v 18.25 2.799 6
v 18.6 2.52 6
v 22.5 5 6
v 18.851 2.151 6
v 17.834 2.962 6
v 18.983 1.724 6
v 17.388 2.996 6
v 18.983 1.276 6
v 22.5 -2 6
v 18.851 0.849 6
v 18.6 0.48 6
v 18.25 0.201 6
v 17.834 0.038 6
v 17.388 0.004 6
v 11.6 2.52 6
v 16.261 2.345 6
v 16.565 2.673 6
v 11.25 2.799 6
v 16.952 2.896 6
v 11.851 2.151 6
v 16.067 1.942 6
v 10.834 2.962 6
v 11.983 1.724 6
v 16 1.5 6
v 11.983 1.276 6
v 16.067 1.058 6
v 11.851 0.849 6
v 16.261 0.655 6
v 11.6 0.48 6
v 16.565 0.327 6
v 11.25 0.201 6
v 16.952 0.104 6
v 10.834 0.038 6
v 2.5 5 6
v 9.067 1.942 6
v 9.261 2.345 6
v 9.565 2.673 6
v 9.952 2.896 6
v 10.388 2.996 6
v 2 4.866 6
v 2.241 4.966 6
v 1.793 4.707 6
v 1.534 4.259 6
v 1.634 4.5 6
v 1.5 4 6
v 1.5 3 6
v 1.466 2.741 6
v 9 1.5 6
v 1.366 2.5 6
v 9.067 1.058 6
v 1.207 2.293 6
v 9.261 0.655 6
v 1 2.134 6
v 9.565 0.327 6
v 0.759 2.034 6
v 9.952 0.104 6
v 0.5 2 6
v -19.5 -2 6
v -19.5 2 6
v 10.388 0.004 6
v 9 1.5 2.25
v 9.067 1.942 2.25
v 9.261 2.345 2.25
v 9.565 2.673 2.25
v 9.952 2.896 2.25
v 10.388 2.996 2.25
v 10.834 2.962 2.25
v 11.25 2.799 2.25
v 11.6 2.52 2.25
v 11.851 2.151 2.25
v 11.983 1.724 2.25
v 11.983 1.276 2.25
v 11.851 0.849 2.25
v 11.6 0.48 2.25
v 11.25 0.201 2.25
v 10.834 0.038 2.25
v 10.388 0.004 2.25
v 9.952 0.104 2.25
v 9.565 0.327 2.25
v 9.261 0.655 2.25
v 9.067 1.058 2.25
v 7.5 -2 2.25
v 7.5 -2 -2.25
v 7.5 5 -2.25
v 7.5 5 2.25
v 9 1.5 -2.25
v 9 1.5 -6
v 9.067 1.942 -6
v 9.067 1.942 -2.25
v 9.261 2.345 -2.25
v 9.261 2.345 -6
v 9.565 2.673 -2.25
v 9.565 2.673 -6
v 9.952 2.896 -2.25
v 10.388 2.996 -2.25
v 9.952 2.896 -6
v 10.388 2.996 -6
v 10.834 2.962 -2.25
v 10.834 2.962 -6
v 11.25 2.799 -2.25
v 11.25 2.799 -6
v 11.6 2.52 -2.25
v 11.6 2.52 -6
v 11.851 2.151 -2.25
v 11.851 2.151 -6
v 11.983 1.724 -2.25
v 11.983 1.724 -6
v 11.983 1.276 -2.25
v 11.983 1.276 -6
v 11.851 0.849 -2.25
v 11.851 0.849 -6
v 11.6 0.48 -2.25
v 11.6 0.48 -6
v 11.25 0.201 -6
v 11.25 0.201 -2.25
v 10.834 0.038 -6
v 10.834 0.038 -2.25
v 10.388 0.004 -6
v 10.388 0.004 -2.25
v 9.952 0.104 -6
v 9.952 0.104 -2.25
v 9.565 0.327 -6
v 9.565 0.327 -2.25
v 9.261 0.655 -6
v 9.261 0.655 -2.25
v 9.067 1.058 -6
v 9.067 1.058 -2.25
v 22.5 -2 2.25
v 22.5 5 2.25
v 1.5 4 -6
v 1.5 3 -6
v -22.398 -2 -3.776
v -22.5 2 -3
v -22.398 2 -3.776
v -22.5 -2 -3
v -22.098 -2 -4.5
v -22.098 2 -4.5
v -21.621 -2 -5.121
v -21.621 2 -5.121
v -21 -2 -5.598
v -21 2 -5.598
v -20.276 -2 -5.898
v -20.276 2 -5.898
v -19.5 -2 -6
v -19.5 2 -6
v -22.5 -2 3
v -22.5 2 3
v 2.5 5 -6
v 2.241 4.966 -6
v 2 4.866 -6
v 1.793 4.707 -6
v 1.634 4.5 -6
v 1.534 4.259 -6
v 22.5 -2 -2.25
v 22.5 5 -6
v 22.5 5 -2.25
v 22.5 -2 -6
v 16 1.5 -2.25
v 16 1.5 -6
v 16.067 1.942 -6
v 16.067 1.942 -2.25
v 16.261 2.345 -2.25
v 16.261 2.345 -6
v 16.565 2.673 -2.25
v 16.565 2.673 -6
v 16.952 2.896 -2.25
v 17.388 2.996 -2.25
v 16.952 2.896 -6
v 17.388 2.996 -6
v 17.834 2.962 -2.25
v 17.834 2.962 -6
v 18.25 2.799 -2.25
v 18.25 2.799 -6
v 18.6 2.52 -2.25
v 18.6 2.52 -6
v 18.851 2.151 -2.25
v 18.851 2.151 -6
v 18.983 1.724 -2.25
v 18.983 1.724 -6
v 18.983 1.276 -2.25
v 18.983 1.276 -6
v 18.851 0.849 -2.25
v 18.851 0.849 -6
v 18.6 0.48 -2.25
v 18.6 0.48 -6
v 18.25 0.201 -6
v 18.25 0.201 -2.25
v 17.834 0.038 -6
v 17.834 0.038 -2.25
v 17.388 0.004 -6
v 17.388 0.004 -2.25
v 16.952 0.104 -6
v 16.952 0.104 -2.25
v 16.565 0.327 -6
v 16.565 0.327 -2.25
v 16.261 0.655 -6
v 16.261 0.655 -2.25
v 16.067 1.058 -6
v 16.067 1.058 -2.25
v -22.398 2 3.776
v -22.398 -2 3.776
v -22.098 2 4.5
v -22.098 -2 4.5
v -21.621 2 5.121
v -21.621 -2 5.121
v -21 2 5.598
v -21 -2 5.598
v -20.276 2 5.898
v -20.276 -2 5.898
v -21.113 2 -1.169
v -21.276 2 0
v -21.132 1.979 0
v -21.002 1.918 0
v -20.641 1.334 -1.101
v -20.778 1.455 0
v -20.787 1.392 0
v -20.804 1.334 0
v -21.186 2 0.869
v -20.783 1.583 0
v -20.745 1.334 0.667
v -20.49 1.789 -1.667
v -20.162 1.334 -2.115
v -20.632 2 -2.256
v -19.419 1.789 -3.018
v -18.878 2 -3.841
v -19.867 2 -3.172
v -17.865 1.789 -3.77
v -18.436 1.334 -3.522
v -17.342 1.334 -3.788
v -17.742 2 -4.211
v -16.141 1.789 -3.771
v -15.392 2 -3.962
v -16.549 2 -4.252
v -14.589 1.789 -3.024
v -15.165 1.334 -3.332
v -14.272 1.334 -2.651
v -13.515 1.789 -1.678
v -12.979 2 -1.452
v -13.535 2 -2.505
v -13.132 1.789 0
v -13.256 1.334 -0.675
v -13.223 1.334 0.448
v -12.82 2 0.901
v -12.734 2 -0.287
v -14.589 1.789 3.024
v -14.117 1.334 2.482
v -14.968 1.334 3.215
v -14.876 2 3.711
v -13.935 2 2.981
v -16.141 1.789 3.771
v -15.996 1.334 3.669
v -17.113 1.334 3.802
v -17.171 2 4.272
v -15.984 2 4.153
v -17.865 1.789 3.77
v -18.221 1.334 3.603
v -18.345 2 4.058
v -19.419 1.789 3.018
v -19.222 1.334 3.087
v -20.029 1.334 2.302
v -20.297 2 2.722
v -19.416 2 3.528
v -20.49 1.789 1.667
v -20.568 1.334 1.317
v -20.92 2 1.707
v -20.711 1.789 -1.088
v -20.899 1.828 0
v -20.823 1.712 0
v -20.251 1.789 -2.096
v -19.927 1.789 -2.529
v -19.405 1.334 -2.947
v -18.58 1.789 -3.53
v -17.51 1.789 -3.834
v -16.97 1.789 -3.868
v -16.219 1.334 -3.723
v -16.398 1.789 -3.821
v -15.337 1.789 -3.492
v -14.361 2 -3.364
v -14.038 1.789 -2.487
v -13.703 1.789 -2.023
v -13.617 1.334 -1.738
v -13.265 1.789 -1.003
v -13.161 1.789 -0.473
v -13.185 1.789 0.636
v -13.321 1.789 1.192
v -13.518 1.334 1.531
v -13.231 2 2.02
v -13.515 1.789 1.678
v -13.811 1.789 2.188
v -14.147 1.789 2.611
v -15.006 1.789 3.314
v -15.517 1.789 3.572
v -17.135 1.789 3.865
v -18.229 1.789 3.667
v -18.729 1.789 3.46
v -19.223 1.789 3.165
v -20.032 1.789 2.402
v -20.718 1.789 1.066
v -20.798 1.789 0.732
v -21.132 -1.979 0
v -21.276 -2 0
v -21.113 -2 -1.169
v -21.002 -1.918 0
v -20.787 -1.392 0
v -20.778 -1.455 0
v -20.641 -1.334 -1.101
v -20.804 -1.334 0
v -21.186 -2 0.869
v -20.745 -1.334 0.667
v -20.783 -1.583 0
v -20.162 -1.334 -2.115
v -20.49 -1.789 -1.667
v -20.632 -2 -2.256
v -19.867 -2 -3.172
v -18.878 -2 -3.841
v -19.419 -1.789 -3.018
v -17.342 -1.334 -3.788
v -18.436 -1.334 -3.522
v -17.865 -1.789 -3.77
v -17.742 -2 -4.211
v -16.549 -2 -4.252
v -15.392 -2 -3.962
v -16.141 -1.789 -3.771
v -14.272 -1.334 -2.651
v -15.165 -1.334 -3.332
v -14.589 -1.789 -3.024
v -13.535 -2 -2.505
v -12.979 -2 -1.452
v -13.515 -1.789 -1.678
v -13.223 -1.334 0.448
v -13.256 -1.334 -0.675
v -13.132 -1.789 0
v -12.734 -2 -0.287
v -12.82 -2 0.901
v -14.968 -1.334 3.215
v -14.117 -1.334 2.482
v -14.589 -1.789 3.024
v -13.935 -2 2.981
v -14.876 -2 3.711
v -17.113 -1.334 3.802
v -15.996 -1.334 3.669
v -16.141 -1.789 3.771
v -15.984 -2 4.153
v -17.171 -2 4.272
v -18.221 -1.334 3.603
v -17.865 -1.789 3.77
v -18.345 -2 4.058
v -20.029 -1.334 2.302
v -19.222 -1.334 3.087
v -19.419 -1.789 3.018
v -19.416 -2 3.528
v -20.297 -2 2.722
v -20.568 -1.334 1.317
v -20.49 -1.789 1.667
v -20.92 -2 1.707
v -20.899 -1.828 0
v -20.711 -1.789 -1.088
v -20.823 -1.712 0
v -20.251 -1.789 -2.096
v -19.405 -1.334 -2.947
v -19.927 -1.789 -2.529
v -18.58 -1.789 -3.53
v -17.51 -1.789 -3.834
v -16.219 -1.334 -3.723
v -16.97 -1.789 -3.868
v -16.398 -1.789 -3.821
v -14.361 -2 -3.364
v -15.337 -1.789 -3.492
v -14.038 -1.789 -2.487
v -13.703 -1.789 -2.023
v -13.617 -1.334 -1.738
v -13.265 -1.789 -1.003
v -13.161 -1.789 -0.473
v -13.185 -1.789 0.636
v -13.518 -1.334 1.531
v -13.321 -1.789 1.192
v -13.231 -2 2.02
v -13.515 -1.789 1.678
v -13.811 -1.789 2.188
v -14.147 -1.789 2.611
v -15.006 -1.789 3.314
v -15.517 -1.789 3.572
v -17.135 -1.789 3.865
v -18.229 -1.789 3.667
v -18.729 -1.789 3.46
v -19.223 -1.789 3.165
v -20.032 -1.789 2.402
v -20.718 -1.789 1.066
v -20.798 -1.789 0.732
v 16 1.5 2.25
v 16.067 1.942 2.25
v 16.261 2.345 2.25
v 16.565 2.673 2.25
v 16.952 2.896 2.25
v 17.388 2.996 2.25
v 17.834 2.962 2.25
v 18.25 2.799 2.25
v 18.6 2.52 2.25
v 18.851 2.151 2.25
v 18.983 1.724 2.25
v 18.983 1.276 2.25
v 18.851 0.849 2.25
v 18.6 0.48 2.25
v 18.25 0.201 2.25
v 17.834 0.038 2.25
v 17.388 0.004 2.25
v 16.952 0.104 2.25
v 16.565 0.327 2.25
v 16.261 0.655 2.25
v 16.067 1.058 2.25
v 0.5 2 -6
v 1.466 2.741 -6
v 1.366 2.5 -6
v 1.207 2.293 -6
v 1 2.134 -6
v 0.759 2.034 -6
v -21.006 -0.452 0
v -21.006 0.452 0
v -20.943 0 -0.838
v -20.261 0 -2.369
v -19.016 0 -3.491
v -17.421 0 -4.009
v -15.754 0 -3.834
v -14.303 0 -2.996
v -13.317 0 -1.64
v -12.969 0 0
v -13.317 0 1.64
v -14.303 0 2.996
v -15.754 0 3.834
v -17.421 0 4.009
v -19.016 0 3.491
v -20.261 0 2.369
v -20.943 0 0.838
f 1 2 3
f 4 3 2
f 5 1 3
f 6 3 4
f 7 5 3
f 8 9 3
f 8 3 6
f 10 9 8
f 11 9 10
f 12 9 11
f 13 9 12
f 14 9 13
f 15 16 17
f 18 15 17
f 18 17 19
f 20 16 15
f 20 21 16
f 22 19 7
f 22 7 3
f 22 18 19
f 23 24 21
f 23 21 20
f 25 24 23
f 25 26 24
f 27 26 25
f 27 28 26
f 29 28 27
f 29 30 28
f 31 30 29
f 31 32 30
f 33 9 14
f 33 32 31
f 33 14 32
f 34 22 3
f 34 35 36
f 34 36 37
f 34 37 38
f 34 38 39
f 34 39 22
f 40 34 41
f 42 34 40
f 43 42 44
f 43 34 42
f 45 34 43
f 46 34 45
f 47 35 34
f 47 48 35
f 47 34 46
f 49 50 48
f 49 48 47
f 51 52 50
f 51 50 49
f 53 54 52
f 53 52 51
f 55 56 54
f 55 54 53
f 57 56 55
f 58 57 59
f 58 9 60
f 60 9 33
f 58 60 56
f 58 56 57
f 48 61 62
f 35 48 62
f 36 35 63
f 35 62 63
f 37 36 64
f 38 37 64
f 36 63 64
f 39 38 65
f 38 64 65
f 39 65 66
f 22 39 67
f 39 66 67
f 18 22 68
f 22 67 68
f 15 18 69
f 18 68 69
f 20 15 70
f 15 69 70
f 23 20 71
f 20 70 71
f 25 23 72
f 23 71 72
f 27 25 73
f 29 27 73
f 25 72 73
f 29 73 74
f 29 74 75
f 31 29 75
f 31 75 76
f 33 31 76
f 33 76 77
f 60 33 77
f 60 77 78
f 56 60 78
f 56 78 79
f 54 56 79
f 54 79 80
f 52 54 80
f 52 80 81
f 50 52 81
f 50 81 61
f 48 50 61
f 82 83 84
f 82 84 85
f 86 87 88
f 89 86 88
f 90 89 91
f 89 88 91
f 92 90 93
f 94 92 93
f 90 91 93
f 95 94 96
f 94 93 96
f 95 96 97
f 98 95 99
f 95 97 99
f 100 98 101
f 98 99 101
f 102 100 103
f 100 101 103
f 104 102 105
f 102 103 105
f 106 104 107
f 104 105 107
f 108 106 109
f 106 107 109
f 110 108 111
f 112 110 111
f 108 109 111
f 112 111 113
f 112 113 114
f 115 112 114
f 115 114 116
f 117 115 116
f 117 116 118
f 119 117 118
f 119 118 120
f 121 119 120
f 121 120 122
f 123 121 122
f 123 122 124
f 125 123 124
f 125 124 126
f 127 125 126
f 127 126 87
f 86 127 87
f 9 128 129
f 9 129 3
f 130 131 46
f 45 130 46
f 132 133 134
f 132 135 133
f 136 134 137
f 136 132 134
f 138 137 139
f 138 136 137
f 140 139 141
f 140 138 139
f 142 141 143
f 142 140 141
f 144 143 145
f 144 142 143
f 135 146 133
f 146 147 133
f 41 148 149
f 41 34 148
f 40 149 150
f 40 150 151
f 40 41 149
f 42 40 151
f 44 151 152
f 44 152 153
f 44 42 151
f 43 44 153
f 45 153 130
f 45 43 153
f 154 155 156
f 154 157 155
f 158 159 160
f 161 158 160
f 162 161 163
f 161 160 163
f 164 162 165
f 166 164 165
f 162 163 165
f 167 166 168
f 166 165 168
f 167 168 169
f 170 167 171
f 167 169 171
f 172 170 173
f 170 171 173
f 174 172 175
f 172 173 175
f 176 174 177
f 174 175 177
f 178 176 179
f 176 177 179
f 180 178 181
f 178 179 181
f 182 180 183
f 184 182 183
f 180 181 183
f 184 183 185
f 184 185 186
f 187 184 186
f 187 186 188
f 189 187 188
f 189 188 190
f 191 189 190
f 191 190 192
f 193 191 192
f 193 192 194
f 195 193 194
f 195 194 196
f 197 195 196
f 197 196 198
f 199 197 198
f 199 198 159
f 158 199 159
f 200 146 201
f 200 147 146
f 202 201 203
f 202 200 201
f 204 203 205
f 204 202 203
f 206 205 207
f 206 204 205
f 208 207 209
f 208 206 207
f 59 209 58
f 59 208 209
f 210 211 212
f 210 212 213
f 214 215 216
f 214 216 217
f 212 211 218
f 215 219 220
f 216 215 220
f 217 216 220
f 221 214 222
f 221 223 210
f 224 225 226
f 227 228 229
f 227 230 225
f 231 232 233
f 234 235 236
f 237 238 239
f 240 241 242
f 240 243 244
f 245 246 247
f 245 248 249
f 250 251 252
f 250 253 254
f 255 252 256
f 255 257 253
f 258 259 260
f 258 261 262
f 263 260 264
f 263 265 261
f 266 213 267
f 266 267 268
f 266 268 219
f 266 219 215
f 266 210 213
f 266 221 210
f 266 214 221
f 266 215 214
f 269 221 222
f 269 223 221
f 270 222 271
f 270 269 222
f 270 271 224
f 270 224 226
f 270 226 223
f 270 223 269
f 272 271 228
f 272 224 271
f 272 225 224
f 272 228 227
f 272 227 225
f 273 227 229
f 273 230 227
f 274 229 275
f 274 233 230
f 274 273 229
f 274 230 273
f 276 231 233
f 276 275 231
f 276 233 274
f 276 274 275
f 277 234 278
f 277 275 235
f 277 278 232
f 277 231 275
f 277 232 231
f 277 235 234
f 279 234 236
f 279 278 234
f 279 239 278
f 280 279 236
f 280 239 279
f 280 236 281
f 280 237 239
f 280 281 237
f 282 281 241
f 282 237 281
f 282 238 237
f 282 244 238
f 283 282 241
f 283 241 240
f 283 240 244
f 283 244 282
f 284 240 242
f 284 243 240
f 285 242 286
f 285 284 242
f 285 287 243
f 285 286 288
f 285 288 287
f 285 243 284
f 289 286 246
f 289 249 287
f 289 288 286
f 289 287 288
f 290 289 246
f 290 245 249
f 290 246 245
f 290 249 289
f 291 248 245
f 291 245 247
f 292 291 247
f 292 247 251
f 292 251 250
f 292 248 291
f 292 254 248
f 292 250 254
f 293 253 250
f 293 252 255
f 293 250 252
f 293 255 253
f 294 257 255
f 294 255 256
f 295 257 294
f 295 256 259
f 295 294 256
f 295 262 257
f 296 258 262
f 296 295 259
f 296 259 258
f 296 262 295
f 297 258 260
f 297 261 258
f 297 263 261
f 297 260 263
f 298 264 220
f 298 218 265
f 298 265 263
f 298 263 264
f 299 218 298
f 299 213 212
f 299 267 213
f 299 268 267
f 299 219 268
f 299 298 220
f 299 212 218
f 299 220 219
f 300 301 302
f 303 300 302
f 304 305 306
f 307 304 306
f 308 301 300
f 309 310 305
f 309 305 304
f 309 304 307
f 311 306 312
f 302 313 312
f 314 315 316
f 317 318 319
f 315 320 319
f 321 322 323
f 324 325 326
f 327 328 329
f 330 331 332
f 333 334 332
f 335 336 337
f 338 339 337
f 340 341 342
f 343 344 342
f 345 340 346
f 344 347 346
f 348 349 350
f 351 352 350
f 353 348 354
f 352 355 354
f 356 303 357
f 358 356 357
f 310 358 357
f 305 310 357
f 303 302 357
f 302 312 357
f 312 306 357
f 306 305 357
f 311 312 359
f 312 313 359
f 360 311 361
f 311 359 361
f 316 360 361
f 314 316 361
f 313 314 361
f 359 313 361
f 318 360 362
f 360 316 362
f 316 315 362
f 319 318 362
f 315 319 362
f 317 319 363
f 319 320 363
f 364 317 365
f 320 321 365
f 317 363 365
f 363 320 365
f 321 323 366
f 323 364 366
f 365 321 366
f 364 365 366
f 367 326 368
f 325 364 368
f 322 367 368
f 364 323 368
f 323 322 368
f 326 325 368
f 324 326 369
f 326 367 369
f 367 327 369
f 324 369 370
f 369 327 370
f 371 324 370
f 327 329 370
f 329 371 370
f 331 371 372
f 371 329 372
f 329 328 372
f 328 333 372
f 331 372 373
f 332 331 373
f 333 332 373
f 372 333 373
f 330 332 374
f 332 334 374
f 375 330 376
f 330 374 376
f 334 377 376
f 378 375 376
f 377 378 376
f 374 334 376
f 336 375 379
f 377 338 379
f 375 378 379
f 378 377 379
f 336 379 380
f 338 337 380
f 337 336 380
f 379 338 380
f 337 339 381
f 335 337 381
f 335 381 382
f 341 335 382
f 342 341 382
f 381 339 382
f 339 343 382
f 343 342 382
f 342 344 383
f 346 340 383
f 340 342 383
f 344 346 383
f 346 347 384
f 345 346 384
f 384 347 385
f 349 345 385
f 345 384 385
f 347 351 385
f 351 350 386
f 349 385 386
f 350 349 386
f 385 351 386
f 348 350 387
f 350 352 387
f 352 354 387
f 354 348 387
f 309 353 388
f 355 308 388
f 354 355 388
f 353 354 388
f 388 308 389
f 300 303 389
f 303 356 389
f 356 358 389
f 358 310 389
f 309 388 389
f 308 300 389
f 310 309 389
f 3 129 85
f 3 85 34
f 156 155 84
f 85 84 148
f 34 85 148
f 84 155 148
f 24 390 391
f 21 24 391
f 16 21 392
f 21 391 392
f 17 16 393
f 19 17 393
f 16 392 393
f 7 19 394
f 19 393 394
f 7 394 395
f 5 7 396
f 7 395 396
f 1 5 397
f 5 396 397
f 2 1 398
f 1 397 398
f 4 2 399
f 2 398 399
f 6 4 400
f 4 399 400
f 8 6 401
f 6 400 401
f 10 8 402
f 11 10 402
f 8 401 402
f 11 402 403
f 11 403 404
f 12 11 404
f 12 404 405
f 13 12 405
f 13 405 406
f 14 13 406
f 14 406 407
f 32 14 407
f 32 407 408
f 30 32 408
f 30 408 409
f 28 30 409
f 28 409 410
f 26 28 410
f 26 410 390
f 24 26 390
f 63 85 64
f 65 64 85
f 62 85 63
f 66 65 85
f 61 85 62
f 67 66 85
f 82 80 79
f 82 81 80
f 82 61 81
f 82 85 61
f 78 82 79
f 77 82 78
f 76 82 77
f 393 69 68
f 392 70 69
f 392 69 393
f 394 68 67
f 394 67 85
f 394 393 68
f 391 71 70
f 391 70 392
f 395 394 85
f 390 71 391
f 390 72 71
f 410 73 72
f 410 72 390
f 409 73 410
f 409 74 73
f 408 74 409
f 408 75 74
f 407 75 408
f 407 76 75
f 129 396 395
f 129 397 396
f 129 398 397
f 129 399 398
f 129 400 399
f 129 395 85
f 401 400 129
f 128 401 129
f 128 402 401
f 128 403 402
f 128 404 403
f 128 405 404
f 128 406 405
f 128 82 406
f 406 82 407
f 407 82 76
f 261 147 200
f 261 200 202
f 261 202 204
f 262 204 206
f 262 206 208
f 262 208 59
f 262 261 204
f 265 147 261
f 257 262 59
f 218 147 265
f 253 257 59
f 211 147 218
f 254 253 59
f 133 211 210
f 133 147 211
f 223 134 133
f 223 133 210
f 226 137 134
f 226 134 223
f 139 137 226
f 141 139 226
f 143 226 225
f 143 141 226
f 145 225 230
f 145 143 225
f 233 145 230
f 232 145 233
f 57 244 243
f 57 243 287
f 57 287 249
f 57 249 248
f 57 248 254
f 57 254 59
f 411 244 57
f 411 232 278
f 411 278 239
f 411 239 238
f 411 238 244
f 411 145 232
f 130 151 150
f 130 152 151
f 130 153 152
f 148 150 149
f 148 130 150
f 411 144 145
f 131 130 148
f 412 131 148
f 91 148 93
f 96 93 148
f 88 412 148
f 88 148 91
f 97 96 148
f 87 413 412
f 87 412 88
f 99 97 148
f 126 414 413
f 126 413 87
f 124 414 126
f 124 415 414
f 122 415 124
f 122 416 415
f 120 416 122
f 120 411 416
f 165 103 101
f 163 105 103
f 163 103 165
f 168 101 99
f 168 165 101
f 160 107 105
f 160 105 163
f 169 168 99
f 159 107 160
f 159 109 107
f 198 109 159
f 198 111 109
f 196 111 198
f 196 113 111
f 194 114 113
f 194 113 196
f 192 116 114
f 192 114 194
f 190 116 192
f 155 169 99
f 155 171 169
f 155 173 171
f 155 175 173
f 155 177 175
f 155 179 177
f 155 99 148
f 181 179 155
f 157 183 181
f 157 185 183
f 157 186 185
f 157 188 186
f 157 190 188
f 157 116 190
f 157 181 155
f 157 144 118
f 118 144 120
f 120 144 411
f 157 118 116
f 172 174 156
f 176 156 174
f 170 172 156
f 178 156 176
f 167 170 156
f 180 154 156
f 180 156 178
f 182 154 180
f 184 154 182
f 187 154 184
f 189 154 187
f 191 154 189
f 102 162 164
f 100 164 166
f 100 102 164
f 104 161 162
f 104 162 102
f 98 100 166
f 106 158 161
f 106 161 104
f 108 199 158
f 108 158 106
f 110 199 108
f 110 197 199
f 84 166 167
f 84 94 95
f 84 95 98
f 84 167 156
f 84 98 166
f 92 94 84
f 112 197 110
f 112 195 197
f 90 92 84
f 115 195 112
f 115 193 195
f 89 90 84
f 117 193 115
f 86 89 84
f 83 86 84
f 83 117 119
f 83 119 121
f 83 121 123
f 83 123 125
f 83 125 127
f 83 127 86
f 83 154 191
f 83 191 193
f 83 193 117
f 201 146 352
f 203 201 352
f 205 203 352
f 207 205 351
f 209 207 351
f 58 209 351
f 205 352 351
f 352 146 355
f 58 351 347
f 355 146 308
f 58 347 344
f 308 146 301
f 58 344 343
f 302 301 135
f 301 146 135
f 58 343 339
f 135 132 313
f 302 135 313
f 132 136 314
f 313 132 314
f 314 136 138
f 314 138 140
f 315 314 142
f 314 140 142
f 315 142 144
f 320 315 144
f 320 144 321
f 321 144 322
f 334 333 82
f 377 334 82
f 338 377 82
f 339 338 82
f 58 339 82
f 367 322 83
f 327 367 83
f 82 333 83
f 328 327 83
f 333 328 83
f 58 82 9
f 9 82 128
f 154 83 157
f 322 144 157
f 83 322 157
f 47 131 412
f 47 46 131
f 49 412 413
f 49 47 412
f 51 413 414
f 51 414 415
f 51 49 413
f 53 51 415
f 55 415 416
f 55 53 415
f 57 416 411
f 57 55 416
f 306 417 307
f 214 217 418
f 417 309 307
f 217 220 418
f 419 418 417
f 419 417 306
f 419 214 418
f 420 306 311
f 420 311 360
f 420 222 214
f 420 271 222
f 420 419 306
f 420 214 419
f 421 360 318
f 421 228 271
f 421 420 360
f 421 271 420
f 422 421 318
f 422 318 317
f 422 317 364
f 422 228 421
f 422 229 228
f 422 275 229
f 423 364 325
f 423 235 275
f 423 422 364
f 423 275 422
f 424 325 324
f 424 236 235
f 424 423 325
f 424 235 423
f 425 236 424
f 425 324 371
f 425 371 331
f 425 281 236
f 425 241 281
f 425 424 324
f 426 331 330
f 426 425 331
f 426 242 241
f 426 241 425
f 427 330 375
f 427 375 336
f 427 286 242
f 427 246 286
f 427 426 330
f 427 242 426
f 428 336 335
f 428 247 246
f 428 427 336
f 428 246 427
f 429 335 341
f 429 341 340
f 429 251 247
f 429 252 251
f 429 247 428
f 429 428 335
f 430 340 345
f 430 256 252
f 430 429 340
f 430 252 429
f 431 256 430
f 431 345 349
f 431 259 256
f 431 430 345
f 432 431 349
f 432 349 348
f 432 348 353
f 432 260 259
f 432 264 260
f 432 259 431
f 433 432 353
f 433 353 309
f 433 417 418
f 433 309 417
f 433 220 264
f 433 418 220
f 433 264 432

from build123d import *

# Parameters (mm, degrees)
SKETCH1_W               = 45
SKETCH1_H               = 12
BOSS_EXTRUDE1_DEPTH     = 2
FILLET1_R               = 3
FILLET15_R              = 0.5
CUT_EXTRUDE2_DEPTH      = 46.442271187
CUT_EXTRUDE2_DEPTH_BACK = 15
SKETCH11_W              = 4.5
SKETCH11_H              = 4
BOSS_EXTRUDE3_DEPTH     = 3
SKETCH14_R              = 1.5
CUT_EXTRUDE4_DEPTH      = 26.985573053
FILLET17_R              = 1


with BuildPart() as part:
    # Sketch1 → Boss-Extrude1 (new, symmetric)
    with BuildSketch(Plane(origin=(0, 0, 0), x_dir=(1, 0, 0), z_dir=(0, 1, 0))):
        Rectangle(SKETCH1_W, SKETCH1_H)
    extrude(amount=BOSS_EXTRUDE1_DEPTH, both=True)

    # Sketch2 → Cut-Revolve2 (revolve, cut)
    with BuildSketch(Plane.XY):
        with BuildLine():
            Line((-17, 2), (-17, -2))
            Line((-17, -2), (-20.5, -2))
            ThreePointArc((-20.5, -2), (-21.031128874, 0), (-20.5, 2))
            Line((-20.5, 2), (-17, 2))
        make_face()
    revolve(axis=Axis((-17, 2, 0), (0, -1, 0)), mode=Mode.SUBTRACT)

    # Fillet1
    fillet1_edges = [part.edges().sort_by_distance(p)[0] for p in [
        (-22.5, 0, 6),
        (-22.5, 0, -6),
    ]]
    fillet(fillet1_edges, radius=FILLET1_R)

    # Fillet15
    fillet15_edges = [part.edges().sort_by_distance(p)[0] for p in [
        (-13.5, 2, 0),
        (-13.5, -2, 0),
    ]]
    fillet(fillet15_edges, radius=FILLET15_R)

    # Sketch11 → Cut-Extrude2 (cut, two sides: drawn at the far end of the back side and taken through both)
    with BuildSketch(Plane(origin=(22.5, 0, 0), x_dir=(0, 0, -1), z_dir=(1, 0, 0)).offset(-CUT_EXTRUDE2_DEPTH_BACK)):
        Rectangle(SKETCH11_W, SKETCH11_H)
    extrude(amount=CUT_EXTRUDE2_DEPTH + CUT_EXTRUDE2_DEPTH_BACK, mode=Mode.SUBTRACT)

    # Sketch13 → Boss-Extrude3 (add)
    with BuildSketch(Plane(origin=(0, 2, 0), x_dir=(1, 0, 0), z_dir=(0, 1, 0))):
        Polygon((22.5, 2.25), (7.5, 2.25), (7.5, -2.25), (22.5, -2.25), (22.5, -6), (1.5, -6), (1.5, -2.5), (1.5, 2.5), (1.5, 6), (22.5, 6), align=None)
    extrude(amount=BOSS_EXTRUDE3_DEPTH)

    # Sketch14 → Cut-Extrude4 (cut, through all)
    with BuildSketch(Plane(origin=(0, 0, -6), x_dir=(-1, 0, 0), z_dir=(0, 0, -1))):
        with Locations((-17.5, 1.5)):
            Circle(SKETCH14_R)
        with Locations((-10.5, 1.5)):
            Circle(SKETCH14_R)
    extrude(amount=-CUT_EXTRUDE4_DEPTH, mode=Mode.SUBTRACT)

    # Fillet17
    fillet17_edges = [part.edges().sort_by_distance(p)[0] for p in [
        (1.5, 2, 0),
        (1.5, 5, 0),
    ]]
    fillet(fillet17_edges, radius=FILLET17_R)


solid = part.part
